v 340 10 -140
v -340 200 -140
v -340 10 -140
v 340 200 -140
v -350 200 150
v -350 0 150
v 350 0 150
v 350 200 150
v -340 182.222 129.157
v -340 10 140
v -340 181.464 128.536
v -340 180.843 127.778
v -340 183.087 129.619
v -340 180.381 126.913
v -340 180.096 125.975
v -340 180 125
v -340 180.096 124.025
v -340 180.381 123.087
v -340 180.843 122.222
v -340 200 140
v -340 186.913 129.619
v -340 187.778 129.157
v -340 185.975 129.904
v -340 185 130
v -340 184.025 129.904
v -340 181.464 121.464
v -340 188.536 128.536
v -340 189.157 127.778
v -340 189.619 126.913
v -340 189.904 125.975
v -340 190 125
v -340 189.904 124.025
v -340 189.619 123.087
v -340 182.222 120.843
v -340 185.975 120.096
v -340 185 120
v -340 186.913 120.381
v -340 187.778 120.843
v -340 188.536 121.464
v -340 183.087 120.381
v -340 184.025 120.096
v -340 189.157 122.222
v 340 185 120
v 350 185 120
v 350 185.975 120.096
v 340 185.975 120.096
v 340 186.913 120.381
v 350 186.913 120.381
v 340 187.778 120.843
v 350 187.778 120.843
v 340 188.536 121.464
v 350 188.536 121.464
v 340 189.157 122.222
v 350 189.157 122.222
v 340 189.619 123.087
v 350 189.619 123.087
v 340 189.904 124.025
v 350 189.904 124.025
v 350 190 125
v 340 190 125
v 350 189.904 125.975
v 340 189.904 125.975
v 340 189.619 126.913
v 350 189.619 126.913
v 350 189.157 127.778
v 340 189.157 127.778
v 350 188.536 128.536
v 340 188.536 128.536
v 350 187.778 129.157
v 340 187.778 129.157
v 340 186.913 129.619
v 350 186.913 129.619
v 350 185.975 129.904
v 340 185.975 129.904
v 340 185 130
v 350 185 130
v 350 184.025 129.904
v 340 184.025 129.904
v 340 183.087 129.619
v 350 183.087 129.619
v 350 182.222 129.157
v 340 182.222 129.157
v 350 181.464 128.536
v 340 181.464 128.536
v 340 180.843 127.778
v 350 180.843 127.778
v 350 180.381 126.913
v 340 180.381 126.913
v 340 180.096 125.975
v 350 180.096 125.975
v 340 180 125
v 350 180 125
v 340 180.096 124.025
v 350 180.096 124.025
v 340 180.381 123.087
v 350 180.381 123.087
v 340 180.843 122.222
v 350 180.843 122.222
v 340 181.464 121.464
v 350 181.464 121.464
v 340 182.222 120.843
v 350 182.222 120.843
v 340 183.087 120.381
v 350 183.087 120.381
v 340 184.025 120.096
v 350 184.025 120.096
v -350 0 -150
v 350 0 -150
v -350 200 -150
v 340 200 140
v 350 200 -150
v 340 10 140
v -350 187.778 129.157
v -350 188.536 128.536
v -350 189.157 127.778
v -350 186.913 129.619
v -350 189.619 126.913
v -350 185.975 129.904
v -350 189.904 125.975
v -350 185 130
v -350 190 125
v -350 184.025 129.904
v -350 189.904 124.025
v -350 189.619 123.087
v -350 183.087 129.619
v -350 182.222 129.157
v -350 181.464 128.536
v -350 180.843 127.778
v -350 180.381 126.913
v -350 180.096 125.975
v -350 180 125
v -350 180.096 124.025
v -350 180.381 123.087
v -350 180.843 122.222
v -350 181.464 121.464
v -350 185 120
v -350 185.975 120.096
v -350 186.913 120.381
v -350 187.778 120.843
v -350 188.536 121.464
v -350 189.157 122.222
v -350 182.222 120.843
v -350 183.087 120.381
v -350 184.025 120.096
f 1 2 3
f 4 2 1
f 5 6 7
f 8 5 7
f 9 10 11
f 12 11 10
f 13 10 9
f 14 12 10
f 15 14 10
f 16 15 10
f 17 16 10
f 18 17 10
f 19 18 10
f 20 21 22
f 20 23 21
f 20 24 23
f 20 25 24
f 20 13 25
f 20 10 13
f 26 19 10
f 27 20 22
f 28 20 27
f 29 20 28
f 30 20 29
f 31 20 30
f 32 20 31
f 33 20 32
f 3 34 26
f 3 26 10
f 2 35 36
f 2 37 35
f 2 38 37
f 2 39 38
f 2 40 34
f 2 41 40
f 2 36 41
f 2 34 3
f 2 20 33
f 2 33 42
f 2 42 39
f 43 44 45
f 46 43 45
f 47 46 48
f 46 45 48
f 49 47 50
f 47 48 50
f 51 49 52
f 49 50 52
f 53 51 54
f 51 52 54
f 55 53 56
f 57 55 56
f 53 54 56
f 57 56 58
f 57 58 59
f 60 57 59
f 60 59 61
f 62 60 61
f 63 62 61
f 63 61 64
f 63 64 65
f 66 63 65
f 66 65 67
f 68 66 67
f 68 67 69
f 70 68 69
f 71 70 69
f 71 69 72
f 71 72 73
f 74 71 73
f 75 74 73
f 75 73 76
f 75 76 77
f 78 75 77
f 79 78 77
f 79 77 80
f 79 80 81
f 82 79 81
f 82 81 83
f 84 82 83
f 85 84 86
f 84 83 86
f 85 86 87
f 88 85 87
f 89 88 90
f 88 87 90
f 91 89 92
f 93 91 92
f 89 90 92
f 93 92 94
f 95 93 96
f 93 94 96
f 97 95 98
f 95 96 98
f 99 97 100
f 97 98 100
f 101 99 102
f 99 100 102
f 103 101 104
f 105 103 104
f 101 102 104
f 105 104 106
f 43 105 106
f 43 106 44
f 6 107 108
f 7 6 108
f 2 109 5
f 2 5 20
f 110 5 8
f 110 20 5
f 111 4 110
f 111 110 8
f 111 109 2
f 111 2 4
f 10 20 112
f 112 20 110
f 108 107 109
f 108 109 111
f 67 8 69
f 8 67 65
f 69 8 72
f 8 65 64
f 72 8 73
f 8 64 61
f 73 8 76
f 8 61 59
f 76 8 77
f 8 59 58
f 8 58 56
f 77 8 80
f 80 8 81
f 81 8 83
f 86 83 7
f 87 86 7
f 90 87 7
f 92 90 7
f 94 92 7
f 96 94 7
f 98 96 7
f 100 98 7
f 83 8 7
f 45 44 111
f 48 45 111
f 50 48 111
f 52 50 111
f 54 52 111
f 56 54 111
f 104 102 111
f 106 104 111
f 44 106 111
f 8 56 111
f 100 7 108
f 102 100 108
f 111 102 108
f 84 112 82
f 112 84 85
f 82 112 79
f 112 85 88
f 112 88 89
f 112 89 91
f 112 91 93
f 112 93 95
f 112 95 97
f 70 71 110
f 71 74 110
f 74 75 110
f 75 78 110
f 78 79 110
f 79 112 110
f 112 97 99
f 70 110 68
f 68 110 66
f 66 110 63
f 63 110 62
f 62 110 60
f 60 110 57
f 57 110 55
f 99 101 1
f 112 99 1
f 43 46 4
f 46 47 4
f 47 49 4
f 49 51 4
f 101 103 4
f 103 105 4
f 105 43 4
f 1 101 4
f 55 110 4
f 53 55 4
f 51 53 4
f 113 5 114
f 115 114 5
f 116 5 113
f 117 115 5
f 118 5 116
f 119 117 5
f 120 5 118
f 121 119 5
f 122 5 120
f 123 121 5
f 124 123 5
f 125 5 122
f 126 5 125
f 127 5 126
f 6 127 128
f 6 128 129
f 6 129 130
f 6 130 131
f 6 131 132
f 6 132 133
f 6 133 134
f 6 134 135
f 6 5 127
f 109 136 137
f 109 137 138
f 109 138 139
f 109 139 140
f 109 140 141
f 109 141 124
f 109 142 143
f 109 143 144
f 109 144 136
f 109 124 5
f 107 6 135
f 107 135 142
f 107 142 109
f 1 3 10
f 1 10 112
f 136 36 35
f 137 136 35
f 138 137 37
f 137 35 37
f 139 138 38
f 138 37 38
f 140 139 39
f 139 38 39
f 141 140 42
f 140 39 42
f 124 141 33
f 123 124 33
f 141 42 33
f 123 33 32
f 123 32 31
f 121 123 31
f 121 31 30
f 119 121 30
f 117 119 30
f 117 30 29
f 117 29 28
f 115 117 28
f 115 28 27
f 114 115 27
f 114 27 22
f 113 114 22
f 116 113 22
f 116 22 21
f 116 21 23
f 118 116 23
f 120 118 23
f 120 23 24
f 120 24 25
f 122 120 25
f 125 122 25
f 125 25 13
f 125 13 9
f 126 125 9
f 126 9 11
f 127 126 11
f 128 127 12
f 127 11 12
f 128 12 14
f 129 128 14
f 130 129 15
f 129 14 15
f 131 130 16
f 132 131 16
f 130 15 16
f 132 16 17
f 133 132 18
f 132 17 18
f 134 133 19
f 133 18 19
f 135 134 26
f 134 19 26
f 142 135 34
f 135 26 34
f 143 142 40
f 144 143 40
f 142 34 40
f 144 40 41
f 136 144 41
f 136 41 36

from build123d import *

# Parameters (mm, degrees)
CROQUIS1_W              = 700
CROQUIS1_H              = 300
SALIENTE_EXTRUIR1_DEPTH = 200
CROQUIS2_W              = 680
CROQUIS2_H              = 280
CORTAR_EXTRUIR1_DEPTH   = 190
CROQUIS3_R              = 5
CORTAR_EXTRUIR2_DEPTH   = 700


with BuildPart() as part:
    # Croquis1 → Saliente-Extruir1 (new body)
    with BuildSketch(Plane(origin=(0, 0, 0), x_dir=(1, 0, 0), z_dir=(0, 1, 0))):
        Rectangle(CROQUIS1_W, CROQUIS1_H)
    extrude(amount=SALIENTE_EXTRUIR1_DEPTH)

    # Croquis2 → Cortar-Extruir1 (cut)
    with BuildSketch(Plane(origin=(0, 200, 0), x_dir=(1, 0, 0), z_dir=(0, 1, 0))):
        Rectangle(CROQUIS2_W, CROQUIS2_H)
    extrude(amount=-CORTAR_EXTRUIR1_DEPTH, mode=Mode.SUBTRACT)

    # Croquis3 → Cortar-Extruir2 (cut)
    with BuildSketch(Plane(origin=(350, 0, 0), x_dir=(0, 0, -1), z_dir=(1, 0, 0))):
        with Locations((-125, 185)):
            Circle(CROQUIS3_R)
    extrude(amount=-CORTAR_EXTRUIR2_DEPTH, mode=Mode.SUBTRACT)


solid = part.part
